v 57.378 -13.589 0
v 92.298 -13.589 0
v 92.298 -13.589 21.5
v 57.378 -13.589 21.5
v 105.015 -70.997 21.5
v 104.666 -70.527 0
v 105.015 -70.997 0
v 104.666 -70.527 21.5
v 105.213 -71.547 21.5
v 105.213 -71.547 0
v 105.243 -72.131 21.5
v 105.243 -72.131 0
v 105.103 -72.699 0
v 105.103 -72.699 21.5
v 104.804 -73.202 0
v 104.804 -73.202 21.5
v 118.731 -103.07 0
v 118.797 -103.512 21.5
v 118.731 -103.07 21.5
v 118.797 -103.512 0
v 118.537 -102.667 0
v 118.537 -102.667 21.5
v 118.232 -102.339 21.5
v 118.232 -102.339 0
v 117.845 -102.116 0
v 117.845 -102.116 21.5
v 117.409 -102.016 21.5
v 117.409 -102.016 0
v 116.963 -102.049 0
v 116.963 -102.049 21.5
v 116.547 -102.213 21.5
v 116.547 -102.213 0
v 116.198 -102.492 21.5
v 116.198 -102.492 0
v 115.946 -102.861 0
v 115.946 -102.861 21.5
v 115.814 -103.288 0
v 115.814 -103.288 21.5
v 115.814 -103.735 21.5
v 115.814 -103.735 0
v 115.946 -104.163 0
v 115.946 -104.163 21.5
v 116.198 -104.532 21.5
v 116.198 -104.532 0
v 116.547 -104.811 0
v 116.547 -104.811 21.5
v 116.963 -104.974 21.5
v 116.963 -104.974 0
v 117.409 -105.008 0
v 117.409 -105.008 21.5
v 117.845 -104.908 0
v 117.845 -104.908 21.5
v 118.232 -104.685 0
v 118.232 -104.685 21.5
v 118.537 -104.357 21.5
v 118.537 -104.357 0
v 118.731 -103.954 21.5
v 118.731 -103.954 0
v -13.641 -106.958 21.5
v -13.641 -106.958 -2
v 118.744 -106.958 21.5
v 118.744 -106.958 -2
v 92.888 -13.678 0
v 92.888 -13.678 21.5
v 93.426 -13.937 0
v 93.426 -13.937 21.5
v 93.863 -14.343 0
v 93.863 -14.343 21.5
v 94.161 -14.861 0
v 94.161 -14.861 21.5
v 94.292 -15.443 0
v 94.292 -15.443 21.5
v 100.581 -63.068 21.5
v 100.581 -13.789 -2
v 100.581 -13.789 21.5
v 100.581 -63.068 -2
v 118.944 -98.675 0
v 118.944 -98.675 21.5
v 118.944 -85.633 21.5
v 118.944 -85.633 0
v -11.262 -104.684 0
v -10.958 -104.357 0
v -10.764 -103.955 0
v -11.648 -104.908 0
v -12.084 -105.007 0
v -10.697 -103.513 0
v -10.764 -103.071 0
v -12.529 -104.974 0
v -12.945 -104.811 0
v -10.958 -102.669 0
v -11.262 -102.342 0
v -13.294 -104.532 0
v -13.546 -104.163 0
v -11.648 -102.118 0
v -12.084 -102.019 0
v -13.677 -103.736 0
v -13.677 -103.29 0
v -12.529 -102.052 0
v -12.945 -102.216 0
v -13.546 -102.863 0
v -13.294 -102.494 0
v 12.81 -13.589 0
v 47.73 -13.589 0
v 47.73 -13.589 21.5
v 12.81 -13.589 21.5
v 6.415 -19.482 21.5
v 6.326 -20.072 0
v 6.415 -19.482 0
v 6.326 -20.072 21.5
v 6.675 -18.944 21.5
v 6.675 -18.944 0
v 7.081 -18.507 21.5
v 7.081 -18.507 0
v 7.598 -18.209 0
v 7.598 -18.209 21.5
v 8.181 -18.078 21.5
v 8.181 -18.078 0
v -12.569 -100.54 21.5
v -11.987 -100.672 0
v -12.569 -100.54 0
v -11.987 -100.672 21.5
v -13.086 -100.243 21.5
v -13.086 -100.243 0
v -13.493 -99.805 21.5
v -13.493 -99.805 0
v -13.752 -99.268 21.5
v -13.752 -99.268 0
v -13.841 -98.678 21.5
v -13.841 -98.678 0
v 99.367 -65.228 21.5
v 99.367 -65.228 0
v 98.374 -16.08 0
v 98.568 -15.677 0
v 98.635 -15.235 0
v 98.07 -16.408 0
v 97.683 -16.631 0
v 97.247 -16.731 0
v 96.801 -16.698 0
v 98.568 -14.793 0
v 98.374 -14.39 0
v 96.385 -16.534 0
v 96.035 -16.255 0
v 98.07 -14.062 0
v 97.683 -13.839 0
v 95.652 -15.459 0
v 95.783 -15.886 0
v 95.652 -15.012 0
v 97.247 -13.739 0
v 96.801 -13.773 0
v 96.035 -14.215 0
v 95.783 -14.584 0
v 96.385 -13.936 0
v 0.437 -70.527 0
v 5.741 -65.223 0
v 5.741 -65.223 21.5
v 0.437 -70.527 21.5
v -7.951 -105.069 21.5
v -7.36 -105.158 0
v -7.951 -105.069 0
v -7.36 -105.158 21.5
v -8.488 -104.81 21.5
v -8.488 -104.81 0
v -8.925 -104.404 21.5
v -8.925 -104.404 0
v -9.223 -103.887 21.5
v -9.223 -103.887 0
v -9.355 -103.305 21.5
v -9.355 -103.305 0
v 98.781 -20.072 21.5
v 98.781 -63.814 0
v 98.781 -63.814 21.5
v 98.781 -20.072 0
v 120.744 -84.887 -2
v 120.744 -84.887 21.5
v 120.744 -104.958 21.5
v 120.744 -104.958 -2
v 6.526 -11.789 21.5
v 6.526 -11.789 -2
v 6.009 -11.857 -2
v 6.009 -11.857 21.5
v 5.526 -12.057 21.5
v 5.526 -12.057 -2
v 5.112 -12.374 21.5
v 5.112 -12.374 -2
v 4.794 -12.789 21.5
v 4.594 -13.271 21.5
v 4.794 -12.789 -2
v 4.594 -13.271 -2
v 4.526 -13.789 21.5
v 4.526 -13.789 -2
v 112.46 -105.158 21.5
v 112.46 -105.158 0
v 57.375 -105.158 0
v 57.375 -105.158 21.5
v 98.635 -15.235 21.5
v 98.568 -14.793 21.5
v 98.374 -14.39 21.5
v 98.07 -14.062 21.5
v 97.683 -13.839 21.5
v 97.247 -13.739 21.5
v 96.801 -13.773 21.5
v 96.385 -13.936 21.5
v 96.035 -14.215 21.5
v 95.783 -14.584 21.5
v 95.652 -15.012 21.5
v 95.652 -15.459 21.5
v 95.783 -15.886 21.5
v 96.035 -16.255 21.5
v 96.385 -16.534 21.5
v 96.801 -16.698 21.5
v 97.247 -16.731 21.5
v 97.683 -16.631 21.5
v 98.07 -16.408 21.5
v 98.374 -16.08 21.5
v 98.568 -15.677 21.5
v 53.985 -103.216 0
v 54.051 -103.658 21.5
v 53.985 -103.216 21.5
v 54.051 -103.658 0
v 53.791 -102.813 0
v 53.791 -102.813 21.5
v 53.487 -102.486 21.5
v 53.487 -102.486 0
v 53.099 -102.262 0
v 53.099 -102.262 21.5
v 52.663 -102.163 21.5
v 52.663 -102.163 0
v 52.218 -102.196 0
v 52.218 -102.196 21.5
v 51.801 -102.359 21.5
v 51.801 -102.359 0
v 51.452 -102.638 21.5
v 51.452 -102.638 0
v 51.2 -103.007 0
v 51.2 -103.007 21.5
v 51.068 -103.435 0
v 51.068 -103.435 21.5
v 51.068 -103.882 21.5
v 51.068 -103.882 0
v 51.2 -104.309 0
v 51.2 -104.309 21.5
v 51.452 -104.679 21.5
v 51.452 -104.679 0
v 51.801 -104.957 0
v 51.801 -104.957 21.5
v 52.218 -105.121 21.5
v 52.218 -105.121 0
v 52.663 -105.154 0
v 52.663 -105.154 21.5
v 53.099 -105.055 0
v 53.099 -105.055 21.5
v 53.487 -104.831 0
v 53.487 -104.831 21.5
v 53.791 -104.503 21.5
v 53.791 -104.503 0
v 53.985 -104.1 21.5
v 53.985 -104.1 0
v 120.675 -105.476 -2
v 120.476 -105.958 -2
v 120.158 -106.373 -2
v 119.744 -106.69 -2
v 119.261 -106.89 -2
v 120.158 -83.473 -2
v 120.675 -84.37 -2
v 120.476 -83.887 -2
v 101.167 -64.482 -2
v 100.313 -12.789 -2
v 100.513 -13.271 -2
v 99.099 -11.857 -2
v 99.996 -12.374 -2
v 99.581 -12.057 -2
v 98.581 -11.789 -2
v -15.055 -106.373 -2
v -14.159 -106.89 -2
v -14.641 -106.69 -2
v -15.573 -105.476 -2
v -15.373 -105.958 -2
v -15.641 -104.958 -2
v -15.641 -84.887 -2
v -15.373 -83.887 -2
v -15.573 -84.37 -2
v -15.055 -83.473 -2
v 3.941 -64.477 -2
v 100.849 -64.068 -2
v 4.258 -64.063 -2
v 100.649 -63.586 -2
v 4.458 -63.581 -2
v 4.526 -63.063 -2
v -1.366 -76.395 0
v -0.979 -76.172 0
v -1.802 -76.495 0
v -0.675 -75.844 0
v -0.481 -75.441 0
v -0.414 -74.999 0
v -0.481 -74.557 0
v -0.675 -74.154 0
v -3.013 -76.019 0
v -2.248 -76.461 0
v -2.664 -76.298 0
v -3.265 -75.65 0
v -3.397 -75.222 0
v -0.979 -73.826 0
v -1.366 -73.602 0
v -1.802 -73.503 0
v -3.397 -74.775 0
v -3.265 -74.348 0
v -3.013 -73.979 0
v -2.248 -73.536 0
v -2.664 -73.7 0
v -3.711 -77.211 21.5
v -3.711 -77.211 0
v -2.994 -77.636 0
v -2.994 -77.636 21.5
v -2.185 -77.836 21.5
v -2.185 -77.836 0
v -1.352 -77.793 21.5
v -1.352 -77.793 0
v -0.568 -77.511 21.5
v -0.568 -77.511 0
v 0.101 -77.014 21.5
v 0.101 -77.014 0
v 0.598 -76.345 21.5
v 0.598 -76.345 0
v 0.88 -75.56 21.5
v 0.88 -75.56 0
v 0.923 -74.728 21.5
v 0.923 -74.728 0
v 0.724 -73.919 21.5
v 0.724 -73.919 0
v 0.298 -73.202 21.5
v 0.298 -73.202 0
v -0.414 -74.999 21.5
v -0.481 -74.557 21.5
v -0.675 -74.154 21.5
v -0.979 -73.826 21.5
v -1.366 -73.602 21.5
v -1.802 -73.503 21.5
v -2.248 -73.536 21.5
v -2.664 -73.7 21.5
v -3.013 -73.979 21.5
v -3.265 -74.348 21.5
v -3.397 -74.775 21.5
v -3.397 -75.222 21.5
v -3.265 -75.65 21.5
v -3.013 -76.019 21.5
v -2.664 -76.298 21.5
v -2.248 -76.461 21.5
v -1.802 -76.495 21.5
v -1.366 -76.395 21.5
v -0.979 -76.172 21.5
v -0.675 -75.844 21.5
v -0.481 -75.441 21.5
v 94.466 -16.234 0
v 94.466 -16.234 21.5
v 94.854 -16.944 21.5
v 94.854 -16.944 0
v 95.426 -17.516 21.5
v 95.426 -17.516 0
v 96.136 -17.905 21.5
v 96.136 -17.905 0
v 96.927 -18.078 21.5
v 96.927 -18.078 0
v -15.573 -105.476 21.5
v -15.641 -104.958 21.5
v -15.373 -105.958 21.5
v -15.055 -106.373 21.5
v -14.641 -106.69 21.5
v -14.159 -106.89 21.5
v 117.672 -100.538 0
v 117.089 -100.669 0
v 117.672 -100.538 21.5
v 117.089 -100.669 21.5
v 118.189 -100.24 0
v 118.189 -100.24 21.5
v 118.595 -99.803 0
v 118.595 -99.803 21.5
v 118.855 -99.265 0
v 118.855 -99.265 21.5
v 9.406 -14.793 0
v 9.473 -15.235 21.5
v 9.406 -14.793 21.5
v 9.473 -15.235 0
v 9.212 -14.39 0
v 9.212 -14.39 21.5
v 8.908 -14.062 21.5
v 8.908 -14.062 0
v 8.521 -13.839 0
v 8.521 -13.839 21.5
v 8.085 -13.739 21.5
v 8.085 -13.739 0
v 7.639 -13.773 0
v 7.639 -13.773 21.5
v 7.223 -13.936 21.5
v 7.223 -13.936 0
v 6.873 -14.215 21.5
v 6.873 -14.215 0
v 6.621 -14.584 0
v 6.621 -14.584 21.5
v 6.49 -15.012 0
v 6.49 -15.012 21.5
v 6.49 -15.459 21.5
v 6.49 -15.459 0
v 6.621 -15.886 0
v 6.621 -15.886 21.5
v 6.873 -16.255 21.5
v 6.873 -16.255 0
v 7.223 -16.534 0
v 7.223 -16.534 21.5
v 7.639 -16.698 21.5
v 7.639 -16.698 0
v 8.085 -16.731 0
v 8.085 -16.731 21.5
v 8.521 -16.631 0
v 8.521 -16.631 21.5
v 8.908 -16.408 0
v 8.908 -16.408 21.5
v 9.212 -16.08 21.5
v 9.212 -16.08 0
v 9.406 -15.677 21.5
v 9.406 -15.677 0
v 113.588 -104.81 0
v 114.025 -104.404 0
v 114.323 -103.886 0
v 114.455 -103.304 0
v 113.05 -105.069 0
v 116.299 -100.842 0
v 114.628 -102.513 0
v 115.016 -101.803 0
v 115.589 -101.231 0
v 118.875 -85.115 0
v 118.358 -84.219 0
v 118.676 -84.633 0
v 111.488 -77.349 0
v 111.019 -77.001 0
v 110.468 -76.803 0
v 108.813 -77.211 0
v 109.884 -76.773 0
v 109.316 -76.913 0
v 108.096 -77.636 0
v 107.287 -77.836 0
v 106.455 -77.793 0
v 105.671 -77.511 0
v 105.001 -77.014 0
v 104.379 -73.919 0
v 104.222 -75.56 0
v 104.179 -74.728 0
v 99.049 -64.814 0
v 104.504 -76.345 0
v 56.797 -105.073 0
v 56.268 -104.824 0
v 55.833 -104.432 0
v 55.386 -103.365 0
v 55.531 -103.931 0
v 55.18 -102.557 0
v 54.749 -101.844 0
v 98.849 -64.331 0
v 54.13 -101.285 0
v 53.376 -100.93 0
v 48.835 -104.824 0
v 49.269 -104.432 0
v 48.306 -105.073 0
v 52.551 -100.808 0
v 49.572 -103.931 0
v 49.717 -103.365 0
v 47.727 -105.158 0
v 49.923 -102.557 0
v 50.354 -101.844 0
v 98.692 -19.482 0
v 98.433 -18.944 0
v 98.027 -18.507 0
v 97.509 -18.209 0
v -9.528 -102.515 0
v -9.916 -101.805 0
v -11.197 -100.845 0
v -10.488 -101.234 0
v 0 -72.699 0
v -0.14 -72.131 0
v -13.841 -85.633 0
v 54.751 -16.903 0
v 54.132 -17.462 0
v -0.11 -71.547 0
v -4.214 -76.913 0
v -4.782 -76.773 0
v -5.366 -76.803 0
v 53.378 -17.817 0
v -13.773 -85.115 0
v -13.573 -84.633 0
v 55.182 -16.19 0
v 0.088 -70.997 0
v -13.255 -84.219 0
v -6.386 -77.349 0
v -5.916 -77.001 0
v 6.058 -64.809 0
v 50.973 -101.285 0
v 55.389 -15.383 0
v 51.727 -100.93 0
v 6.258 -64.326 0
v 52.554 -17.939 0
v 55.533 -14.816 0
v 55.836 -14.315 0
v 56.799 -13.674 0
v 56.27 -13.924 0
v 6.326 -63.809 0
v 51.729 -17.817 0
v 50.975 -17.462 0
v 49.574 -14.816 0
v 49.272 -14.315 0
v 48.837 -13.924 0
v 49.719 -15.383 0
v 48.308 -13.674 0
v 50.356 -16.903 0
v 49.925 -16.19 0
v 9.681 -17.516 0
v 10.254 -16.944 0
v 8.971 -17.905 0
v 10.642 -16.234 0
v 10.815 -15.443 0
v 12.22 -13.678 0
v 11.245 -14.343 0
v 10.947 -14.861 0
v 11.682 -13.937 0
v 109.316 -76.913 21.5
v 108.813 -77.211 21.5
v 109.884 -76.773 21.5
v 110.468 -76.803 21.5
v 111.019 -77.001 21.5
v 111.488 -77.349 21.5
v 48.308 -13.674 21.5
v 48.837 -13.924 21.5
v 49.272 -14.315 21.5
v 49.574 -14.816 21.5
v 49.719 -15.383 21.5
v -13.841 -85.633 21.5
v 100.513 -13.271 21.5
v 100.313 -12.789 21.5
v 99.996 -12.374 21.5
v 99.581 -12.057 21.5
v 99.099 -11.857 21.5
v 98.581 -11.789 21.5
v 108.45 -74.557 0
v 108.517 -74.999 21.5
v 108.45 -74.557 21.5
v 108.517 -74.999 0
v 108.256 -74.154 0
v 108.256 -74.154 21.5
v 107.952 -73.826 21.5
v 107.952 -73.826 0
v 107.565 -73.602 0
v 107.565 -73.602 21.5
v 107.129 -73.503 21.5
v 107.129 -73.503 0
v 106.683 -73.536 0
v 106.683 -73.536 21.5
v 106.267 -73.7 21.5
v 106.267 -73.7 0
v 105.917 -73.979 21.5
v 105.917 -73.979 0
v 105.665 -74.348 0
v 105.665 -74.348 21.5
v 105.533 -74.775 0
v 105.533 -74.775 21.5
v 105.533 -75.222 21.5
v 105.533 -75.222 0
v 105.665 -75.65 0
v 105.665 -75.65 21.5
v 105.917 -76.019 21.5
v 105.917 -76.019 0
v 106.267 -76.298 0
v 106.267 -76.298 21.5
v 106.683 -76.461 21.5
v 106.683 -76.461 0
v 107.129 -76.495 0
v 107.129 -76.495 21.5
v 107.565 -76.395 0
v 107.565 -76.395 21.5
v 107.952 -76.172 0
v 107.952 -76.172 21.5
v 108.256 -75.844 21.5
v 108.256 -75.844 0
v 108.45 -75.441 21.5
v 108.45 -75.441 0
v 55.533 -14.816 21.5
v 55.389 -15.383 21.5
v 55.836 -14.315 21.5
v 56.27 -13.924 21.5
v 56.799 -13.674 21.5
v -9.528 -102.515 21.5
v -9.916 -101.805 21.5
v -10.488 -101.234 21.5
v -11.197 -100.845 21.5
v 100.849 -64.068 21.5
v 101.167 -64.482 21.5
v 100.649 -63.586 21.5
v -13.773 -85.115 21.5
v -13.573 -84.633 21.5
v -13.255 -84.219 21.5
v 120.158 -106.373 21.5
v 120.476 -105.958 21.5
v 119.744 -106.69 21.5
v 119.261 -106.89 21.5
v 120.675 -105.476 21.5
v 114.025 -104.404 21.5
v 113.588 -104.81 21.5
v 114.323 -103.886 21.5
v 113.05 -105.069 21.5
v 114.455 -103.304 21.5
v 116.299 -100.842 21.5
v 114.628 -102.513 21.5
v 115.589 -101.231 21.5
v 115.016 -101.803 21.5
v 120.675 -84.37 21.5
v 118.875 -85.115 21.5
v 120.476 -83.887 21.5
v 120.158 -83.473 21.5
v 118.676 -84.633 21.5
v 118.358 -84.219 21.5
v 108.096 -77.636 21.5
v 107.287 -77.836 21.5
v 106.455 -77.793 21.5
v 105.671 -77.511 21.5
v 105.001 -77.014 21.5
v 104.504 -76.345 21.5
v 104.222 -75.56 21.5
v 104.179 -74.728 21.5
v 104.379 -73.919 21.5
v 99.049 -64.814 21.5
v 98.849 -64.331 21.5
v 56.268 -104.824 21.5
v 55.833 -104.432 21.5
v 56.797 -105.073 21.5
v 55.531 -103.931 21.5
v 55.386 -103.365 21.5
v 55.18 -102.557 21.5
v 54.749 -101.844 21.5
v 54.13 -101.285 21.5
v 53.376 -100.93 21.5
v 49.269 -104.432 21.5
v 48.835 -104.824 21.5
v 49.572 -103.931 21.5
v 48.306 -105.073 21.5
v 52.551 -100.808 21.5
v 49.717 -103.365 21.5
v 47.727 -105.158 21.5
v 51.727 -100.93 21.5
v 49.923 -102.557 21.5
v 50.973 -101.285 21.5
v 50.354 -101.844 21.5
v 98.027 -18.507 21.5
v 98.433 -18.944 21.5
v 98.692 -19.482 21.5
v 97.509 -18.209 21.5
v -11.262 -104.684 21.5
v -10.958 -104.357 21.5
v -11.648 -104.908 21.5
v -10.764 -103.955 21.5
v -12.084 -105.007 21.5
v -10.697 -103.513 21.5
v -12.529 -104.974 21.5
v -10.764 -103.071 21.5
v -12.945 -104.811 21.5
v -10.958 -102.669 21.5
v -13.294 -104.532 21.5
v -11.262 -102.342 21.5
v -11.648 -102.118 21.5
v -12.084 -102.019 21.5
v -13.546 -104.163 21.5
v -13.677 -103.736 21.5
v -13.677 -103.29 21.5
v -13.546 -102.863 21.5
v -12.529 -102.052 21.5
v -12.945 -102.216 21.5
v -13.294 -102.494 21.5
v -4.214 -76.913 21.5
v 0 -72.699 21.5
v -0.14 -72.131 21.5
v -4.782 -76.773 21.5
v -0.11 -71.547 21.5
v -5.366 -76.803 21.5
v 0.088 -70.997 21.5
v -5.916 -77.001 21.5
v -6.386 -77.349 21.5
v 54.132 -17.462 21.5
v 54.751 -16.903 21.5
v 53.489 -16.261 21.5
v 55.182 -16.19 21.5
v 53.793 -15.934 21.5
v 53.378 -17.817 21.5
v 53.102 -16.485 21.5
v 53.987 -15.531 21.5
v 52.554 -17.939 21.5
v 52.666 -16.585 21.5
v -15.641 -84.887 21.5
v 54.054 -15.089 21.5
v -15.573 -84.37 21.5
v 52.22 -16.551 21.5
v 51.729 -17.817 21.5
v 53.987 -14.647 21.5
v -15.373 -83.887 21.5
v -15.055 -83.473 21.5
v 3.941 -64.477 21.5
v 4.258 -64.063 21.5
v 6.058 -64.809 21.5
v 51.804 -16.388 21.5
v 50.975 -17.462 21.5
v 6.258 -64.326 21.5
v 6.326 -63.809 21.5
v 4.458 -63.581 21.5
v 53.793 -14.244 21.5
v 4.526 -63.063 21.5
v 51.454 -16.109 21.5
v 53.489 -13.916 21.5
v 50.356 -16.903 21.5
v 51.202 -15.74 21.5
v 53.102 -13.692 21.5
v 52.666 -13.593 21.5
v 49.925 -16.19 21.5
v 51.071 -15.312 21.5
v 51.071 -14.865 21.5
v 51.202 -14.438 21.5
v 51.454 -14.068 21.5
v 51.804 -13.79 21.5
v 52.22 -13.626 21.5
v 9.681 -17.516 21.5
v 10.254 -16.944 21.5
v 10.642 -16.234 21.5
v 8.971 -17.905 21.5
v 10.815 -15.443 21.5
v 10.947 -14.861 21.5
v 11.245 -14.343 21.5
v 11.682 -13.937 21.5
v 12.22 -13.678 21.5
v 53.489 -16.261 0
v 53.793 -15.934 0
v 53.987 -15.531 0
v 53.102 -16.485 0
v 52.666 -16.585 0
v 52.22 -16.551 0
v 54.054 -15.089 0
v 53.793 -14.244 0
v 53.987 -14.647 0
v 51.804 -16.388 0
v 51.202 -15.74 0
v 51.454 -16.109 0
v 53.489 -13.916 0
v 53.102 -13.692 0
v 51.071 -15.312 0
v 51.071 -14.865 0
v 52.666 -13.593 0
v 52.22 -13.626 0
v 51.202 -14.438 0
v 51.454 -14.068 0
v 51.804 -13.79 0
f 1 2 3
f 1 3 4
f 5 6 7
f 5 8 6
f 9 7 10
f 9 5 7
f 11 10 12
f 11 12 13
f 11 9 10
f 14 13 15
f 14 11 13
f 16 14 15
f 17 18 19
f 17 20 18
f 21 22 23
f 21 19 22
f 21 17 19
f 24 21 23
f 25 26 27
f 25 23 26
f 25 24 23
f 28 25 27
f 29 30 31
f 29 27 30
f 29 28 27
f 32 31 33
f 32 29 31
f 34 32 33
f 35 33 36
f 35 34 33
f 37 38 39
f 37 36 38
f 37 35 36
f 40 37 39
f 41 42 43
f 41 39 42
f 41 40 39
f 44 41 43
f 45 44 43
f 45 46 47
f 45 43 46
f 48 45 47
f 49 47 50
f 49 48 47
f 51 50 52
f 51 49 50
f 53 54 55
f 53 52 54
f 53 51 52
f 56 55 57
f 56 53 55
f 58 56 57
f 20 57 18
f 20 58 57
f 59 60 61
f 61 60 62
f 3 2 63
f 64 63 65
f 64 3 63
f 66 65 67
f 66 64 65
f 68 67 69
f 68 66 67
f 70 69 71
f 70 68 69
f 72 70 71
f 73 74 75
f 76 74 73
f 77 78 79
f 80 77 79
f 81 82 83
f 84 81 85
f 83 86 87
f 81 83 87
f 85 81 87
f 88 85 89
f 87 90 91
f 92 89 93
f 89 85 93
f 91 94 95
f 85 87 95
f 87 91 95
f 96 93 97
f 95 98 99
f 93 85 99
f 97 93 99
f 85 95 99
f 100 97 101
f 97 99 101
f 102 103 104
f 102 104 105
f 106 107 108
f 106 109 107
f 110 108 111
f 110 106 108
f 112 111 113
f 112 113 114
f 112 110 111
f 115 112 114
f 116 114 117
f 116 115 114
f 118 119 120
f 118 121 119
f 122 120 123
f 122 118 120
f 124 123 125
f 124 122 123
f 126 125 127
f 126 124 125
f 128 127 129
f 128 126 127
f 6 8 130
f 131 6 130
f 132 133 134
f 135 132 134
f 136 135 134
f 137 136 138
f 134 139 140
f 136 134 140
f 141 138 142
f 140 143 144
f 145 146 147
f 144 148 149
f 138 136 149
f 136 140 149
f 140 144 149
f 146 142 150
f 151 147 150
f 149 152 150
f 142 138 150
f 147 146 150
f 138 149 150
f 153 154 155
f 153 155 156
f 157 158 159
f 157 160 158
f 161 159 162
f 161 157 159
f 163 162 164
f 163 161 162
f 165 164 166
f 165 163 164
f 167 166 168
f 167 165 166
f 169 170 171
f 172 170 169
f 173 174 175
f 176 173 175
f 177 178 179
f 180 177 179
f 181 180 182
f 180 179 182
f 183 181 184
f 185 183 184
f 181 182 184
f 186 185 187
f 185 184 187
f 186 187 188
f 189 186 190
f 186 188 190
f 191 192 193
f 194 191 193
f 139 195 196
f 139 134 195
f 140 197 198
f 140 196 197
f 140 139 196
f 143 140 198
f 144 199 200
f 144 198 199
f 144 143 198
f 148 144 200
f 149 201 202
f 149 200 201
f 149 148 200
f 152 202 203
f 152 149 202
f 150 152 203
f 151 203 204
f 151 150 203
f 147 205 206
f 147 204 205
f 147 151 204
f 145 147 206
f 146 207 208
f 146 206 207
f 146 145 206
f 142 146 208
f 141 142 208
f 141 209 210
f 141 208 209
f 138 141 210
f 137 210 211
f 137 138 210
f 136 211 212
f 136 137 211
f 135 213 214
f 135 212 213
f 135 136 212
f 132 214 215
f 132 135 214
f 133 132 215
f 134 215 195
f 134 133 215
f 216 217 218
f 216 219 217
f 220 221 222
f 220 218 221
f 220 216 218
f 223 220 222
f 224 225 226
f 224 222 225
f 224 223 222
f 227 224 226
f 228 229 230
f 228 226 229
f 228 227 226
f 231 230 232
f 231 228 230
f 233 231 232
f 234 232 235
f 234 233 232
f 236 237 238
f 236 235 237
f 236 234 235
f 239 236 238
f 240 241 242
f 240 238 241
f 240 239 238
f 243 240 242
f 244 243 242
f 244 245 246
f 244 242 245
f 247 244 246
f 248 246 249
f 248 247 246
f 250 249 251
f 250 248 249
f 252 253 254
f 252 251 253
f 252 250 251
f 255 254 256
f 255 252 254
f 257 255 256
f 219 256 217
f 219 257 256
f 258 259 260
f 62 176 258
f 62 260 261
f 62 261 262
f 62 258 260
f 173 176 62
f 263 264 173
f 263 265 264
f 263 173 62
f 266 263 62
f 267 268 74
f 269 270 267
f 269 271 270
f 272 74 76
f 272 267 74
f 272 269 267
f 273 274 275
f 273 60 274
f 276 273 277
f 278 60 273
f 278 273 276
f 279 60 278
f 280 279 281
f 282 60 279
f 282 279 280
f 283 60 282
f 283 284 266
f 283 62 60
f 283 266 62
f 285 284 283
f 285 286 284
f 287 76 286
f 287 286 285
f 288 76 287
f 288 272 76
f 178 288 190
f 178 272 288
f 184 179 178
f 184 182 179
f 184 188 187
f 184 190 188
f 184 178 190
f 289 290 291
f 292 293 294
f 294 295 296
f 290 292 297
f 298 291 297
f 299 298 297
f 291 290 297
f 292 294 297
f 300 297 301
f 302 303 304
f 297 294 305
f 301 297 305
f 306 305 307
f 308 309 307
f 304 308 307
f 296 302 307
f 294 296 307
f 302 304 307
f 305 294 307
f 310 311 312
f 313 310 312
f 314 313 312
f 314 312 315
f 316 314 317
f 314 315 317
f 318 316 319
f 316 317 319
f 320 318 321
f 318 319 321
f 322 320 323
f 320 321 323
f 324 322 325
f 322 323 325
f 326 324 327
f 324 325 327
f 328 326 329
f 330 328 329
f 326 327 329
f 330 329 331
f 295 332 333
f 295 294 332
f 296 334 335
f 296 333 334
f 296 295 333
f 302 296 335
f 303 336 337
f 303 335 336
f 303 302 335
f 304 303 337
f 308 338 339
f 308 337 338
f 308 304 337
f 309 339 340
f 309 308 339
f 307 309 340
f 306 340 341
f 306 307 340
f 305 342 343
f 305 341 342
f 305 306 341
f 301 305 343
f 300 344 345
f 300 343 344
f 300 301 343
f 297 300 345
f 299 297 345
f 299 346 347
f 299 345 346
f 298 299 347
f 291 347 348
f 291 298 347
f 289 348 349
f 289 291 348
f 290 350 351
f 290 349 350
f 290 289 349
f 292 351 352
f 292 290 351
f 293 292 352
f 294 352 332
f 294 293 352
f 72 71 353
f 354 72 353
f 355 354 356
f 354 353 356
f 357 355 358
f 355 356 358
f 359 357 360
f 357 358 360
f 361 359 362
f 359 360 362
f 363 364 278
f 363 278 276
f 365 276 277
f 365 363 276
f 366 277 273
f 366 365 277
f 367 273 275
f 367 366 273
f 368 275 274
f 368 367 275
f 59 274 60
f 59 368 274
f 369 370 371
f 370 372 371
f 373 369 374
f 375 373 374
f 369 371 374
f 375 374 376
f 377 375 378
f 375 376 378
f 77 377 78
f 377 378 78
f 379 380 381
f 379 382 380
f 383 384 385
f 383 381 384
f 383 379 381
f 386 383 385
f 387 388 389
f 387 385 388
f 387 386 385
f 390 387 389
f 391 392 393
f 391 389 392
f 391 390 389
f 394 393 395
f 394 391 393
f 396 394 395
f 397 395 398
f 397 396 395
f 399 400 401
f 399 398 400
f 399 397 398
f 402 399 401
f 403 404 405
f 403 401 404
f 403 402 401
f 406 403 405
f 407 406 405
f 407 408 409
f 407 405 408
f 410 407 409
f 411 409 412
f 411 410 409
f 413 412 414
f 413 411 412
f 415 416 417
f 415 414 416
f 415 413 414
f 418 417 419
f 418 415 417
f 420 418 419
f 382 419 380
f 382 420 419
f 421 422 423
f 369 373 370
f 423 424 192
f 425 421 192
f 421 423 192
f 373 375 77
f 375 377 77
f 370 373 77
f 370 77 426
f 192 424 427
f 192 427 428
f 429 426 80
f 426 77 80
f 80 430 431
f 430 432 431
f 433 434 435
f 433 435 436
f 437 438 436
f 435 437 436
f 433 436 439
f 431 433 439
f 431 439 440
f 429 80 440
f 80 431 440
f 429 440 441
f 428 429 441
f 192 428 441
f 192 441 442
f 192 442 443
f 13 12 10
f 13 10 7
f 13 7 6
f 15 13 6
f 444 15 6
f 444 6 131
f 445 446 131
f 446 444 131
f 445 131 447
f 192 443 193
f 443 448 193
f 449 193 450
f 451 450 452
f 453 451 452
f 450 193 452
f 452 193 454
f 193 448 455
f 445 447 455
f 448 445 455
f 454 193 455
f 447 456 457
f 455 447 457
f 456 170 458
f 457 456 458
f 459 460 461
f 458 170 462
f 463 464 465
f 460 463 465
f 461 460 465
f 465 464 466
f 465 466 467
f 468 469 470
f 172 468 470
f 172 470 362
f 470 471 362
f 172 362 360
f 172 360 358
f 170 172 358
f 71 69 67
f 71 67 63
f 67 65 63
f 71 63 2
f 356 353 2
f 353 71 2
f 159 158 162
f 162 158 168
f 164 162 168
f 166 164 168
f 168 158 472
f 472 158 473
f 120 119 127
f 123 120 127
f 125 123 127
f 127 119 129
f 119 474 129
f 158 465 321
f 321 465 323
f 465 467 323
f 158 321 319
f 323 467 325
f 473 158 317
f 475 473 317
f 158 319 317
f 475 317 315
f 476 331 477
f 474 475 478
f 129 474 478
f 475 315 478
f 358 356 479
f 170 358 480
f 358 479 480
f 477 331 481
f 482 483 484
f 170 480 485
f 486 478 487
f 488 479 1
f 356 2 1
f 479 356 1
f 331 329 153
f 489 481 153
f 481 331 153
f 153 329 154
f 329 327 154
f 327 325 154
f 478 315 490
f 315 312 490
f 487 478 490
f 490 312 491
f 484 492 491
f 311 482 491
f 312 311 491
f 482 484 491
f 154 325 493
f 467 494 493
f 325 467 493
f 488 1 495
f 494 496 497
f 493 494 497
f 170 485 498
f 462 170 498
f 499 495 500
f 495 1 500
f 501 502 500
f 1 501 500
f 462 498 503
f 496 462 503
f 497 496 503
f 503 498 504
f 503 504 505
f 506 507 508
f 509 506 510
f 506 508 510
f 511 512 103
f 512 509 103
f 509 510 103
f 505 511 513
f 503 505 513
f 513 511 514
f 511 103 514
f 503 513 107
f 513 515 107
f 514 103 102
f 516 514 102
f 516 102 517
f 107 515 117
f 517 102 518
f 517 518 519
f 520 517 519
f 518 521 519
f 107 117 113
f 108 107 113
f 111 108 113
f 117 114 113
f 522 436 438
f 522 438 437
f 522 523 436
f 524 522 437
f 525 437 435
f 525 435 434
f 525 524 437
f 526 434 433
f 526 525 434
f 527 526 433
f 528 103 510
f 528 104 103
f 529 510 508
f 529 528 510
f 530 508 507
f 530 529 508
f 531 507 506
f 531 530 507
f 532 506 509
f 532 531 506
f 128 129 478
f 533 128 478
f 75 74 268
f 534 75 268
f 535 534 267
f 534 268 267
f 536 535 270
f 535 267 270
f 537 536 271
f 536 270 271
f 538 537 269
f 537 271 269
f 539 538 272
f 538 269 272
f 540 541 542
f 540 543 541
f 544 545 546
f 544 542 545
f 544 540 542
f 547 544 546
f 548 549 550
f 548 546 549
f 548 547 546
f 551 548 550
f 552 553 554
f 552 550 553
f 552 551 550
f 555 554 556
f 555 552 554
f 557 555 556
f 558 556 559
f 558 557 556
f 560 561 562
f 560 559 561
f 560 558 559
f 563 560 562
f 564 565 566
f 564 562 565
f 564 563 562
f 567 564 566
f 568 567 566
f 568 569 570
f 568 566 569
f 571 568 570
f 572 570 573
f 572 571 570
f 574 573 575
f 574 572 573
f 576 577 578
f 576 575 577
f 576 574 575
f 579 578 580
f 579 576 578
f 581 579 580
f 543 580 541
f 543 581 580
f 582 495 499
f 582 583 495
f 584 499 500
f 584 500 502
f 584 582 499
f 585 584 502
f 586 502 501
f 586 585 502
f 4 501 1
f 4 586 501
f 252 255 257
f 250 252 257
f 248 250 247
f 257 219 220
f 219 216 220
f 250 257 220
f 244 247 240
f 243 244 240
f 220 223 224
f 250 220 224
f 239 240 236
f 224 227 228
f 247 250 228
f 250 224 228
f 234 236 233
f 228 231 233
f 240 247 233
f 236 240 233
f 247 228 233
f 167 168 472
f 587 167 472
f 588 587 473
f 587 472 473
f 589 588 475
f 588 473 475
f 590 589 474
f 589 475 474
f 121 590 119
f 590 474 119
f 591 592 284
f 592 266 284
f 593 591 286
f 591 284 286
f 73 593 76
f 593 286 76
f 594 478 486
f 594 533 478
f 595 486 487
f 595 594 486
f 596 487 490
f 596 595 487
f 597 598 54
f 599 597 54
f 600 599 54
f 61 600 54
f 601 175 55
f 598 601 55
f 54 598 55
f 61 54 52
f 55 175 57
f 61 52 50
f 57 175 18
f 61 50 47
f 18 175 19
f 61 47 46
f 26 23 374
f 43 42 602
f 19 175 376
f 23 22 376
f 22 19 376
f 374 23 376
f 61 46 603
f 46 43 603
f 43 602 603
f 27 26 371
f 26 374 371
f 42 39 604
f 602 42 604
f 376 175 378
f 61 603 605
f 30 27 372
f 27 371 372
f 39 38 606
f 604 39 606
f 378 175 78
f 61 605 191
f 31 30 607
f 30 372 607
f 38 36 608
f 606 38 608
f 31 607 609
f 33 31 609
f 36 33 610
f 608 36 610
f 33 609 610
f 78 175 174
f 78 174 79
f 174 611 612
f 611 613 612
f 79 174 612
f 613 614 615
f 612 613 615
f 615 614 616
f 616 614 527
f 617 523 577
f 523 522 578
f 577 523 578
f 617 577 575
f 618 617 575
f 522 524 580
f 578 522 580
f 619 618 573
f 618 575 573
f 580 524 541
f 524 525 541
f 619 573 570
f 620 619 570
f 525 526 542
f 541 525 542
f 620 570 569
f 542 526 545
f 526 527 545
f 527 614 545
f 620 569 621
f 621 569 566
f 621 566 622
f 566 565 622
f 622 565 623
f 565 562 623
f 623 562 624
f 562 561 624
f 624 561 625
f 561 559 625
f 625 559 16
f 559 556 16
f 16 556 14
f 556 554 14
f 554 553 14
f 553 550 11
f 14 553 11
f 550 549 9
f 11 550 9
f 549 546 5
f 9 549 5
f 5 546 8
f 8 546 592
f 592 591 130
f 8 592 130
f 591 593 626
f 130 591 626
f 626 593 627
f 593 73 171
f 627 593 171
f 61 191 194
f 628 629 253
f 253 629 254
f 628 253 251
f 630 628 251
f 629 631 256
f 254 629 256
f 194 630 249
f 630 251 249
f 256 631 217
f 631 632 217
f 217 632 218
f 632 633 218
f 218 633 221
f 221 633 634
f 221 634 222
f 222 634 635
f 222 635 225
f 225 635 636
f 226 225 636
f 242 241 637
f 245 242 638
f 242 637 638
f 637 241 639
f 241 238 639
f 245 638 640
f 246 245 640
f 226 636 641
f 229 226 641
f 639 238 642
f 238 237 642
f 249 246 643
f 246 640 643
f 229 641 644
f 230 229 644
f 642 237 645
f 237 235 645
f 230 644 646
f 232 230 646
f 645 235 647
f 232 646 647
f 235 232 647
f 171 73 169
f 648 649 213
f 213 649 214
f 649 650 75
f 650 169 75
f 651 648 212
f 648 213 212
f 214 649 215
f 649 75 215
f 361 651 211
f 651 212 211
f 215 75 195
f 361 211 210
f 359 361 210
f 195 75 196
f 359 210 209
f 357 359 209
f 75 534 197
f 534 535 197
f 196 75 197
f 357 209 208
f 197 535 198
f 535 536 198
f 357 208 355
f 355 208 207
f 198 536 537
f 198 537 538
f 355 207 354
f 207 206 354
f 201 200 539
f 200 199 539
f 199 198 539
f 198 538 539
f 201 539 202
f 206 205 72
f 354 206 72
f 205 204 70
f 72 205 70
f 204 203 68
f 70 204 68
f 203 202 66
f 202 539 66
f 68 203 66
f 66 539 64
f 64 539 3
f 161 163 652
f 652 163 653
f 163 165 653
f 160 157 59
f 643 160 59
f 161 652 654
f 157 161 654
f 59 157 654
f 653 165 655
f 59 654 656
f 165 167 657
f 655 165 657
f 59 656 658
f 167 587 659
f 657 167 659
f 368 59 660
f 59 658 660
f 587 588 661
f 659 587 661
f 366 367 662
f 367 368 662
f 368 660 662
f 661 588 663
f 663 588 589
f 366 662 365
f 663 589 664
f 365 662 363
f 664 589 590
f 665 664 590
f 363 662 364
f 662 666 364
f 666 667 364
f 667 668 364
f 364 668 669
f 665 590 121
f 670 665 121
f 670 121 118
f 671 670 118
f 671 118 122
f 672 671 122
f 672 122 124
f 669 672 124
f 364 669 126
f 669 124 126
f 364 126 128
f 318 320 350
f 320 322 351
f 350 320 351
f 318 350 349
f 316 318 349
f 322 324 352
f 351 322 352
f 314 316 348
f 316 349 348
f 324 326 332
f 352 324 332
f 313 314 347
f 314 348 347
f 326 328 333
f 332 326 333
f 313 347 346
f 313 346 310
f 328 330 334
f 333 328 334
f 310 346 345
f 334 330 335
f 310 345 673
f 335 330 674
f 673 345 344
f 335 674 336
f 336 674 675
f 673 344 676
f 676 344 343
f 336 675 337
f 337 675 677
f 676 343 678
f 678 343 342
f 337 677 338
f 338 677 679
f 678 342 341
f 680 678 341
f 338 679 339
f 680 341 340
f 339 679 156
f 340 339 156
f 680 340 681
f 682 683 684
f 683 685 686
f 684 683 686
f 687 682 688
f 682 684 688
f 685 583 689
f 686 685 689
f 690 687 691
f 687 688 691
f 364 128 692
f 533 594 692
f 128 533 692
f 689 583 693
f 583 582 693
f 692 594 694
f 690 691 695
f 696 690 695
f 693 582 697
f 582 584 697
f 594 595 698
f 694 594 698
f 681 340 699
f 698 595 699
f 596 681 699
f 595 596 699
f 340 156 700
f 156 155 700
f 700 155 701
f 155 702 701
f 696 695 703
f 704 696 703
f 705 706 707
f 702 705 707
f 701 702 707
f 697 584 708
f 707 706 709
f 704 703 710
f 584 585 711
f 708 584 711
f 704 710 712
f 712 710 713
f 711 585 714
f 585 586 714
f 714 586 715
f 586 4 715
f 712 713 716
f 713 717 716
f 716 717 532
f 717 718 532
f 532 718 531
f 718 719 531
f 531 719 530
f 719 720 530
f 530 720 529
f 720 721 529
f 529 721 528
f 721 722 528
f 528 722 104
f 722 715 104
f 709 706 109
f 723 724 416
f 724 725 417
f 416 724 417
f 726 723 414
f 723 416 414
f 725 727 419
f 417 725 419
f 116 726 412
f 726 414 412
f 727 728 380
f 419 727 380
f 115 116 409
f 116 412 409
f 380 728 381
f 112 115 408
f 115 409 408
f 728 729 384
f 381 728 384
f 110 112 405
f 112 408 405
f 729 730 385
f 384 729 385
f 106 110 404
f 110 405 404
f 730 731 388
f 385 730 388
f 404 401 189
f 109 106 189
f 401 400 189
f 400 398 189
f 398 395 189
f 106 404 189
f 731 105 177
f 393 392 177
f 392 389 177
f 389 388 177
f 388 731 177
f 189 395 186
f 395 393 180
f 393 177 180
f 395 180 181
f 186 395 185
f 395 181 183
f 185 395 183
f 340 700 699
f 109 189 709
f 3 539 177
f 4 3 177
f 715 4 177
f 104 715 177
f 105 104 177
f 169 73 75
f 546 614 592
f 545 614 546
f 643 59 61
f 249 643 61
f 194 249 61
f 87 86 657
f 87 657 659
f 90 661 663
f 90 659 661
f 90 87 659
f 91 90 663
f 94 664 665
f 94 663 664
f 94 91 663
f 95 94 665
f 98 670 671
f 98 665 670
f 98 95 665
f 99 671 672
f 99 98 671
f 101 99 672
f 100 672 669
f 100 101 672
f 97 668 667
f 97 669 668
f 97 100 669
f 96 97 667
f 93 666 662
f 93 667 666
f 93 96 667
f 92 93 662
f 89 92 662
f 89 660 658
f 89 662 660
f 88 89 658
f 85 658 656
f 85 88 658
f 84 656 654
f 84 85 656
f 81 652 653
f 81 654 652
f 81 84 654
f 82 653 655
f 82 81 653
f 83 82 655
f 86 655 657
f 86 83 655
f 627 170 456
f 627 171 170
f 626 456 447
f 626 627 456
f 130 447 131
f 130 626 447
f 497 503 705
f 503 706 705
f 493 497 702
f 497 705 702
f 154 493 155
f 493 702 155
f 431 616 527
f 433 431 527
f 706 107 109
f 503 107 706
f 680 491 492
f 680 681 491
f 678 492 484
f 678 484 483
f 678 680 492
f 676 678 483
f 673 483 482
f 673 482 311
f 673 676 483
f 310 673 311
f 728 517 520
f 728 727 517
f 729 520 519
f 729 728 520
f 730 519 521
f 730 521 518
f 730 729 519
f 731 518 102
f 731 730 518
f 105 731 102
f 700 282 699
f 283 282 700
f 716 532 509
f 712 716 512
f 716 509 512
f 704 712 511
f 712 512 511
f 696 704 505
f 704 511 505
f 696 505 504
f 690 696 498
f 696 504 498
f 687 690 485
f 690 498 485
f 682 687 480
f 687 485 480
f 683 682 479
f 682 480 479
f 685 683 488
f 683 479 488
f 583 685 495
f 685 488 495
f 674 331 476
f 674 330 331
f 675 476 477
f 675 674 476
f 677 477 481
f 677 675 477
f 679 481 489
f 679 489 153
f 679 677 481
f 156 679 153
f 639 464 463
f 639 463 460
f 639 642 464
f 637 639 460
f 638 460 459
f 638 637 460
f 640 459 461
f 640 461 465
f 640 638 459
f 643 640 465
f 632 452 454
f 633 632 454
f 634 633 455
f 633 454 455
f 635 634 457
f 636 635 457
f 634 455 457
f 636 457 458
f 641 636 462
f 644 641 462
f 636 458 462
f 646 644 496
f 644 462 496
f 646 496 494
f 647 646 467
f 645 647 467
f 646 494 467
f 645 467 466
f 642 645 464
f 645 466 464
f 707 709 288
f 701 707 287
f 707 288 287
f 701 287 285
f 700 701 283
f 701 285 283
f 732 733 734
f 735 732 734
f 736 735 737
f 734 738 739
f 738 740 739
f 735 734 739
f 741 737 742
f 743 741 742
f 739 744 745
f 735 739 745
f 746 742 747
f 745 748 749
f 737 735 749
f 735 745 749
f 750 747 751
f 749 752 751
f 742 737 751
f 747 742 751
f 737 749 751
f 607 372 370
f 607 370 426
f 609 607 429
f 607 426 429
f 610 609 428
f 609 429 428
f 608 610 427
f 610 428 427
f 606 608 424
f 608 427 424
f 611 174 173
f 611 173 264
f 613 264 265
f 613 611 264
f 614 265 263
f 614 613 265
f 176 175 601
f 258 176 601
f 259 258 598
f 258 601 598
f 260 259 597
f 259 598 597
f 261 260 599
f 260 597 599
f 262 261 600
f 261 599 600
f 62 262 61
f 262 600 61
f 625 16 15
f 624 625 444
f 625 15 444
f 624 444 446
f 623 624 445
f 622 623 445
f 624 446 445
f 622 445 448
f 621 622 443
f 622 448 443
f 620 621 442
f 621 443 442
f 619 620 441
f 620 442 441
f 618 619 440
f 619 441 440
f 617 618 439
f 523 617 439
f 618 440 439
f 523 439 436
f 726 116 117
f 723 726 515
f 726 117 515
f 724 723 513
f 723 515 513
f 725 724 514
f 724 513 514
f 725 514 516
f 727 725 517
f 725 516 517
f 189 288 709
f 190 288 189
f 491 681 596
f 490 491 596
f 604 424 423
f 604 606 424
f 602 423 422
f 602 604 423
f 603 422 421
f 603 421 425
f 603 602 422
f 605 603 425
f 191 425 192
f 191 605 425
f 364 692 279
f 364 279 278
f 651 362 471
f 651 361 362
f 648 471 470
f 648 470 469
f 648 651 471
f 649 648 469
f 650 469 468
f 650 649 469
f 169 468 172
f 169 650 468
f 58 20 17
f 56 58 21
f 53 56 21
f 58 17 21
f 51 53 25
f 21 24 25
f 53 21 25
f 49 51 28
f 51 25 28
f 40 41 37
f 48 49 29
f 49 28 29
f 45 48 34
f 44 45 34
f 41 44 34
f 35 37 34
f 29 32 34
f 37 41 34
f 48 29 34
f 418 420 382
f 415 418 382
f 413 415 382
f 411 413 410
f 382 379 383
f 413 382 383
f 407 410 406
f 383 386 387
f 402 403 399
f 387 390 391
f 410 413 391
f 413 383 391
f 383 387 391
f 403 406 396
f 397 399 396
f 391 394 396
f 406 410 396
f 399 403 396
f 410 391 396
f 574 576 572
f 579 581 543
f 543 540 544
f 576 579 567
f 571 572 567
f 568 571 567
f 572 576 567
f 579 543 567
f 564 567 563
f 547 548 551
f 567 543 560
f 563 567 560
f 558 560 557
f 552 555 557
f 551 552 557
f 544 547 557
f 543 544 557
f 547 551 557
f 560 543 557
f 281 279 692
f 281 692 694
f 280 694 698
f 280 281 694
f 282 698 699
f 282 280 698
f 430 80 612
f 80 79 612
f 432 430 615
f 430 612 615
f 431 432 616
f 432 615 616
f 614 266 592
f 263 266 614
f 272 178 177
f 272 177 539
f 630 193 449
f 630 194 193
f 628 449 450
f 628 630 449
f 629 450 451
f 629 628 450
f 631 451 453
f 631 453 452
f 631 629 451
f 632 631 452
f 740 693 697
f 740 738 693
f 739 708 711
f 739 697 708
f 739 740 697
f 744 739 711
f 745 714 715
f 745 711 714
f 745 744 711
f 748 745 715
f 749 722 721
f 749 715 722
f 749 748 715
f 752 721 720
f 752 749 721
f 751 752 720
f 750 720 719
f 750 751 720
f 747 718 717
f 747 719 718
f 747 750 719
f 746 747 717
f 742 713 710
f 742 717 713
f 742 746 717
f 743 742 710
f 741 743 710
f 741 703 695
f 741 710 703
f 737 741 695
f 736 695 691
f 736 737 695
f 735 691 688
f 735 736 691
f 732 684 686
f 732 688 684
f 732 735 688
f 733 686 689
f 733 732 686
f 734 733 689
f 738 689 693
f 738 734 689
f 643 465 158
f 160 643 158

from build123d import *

# Parameters (mm, degrees)
BOSS_EXTRUDE1_DEPTH       = 2
BOSS_EXTRUDE2_DEPTH       = 21.5
FILLET1_R                 = 2
FILLET2_R                 = 2
BOSS_EXTRUDE3_START       = -22
BOSS_EXTRUDE3_OUTLINE_R   = 1.498302823
BOSS_EXTRUDE3_OUTLINE_R_2 = 1.5
BOSS_EXTRUDE3_DEPTH       = 22
FILLET3_R                 = 2


with BuildPart() as part:
    # Sketch3 → Boss-Extrude1 (new body)
    with BuildSketch(Plane.XY):
        Polygon((-15.640963985, -84.058941087), (4.526340861, -63.891636241), (4.526340861, -11.788708514), (100.581340861, -11.788708514), (100.581340861, -63.896636241), (120.743645706, -84.058941087), (120.743645706, -106.958318205), (104.551340861, -106.958318205), (-15.640963985, -106.958318205), (-15.640963985, -90.76601336), align=None)
    extrude(amount=-BOSS_EXTRUDE1_DEPTH)

    # Sketch3<3> → Boss-Extrude2 (add)
    with BuildSketch(Plane.XY):
        Polygon((-15.640963985, -90.76601336), (-15.640963985, -84.058941087), (4.526340861, -63.891636241), (4.526340861, -11.788708514), (100.581340861, -11.788708514), (100.581340861, -63.896636241), (120.743645706, -84.058941087), (120.743645706, -106.958318205), (104.551340861, -106.958318205), (-15.640963985, -106.958318205), align=None)
        Polygon((-13.840963985, -90.76601336), (-13.840963985, -105.158318205), (104.551340861, -105.158318205), (118.943645706, -105.158318205), (118.943645706, -84.804525499), (98.781340861, -64.642220653), (98.781340861, -13.588708514), (6.326340861, -13.588708514), (6.326340861, -64.637220653), (-13.840963985, -84.804525499), align=None, mode=Mode.SUBTRACT)
    extrude(amount=BOSS_EXTRUDE2_DEPTH)

    # Fillet1
    fillet1_edges = [part.edges().sort_by_distance(p)[0] for p in [
        (-15.640963985, -84.058941087, 9.75),
        (4.526340861, -63.891636241, 9.75),
        (4.526340861, -11.788708514, 9.75),
        (100.581340861, -11.788708514, 9.75),
        (100.581340861, -63.896636241, 9.75),
        (120.743645706, -84.058941087, 9.75),
        (120.743645706, -106.958318205, 9.75),
        (-15.640963985, -106.958318205, 9.75),
        (-13.840963985, -105.158318205, 10.75),
        (-13.840963985, -84.804525499, 10.75),
        (6.326340861, -64.637220653, 10.75),
        (6.326340861, -13.588708514, 10.75),
        (98.781340861, -13.588708514, 10.75),
        (98.781340861, -64.642220653, 10.75),
        (118.943645706, -105.158318205, 10.75),
    ]]
    fillet(fillet1_edges, radius=FILLET1_R)

    # Fillet2
    fillet2_edges = [part.edges().sort_by_distance(p)[0] for p in [
        (118.943645706, -84.804525499, 10.75),
    ]]
    fillet(fillet2_edges, radius=FILLET2_R)

    # Boss-Extrude3: read off the stored shape, not the designer's step
    # Boss-Extrude3 outline → Boss-Extrude3 (add)
    with BuildSketch(Plane.XY.offset(21.5).offset(BOSS_EXTRUDE3_START)):
        with BuildLine():
            ThreePointArc((101.167127298, -64.482422679), (100.733581796, -63.833575981), (100.581340861, -63.068209116))
            Line((100.581340861, -63.068209116), (100.581340861, -13.788708514))
            ThreePointArc((100.581340861, -13.788708514), (99.995554423, -12.374494952), (98.581340861, -11.788708514))
            Line((98.581340861, -11.788708514), (6.526340861, -11.788708514))
            ThreePointArc((6.526340861, -11.788708514), (5.112127298, -12.374494952), (4.526340861, -13.788708514))
            Line((4.526340861, -13.788708514), (4.526340861, -63.063209116))
            ThreePointArc((4.526340861, -63.063209116), (4.374099926, -63.828575981), (3.940554423, -64.477422679))
            Line((3.940554423, -64.477422679), (-15.055177547, -83.473154649))
            ThreePointArc((-15.055177547, -83.473154649), (-15.48872305, -84.122001347), (-15.640963985, -84.887368211))
            Line((-15.640963985, -84.887368211), (-15.640963985, -104.958318205))
            ThreePointArc((-15.640963985, -104.958318205), (-15.055177547, -106.372531767), (-13.640963985, -106.958318205))
            Line((-13.640963985, -106.958318205), (118.743645706, -106.958318205))
            ThreePointArc((118.743645706, -106.958318205), (120.157859269, -106.372531767), (120.743645706, -104.958318205))
            Line((120.743645706, -104.958318205), (120.743645706, -84.887368211))
            ThreePointArc((120.743645706, -84.887368211), (120.591404771, -84.122001347), (120.157859269, -83.473154649))
            Line((120.157859269, -83.473154649), (101.167127298, -64.482422679))
        make_face()
        with Locations((-12.195717461, -103.513071681)):
            Circle(BOSS_EXTRUDE3_OUTLINE_R, mode=Mode.SUBTRACT)
        with Locations((-1.913886606, -74.998768464)):
            Circle(BOSS_EXTRUDE3_OUTLINE_R_2, mode=Mode.SUBTRACT)
        with Locations((52.551340861, -103.658318205)):
            Circle(BOSS_EXTRUDE3_OUTLINE_R_2, mode=Mode.SUBTRACT)
        with Locations((117.297199097, -103.511871596)):
            Circle(BOSS_EXTRUDE3_OUTLINE_R_2, mode=Mode.SUBTRACT)
        with Locations((107.016568327, -74.998768464)):
            Circle(BOSS_EXTRUDE3_OUTLINE_R_2, mode=Mode.SUBTRACT)
        with BuildLine():
            ThreePointArc((-13.840963985, -85.632952624), (-13.68872305, -84.867585759), (-13.255177547, -84.218739061))
            Line((-13.255177547, -84.218739061), (-4.688095726, -75.651657241))
            ThreePointArc((-4.688095726, -75.651657241), (0.101367721, -77.01402279), (-1.260997829, -72.224559343))
            Line((-1.260997829, -72.224559343), (5.740554423, -65.223007091))
            ThreePointArc((5.740554423, -65.223007091), (6.174099926, -64.574160393), (6.326340861, -63.808793529))
            Line((6.326340861, -63.808793529), (6.326340861, -17.561464123))
            ThreePointArc((6.326340861, -17.561464123), (9.988041797, -17.25040945), (10.29909647, -13.588708514))
            Line((10.29909647, -13.588708514), (50.130516698, -13.588708514))
            ThreePointArc((50.130516698, -13.588708514), (52.553840861, -17.938708514), (54.977165024, -13.588708514))
            Line((54.977165024, -13.588708514), (94.808585252, -13.588708514))
            ThreePointArc((94.808585252, -13.588708514), (95.119639925, -17.25040945), (98.781340861, -17.561464123))
            Line((98.781340861, -17.561464123), (98.781340861, -63.813793529))
            ThreePointArc((98.781340861, -63.813793529), (98.933581796, -64.579160393), (99.367127298, -65.228007091))
            Line((99.367127298, -65.228007091), (106.36367955, -72.224559343))
            ThreePointArc((106.36367955, -72.224559343), (105.001314001, -77.01402279), (109.790777448, -75.651657241))
            Line((109.790777448, -75.651657241), (118.357859269, -84.218739061))
            ThreePointArc((118.357859269, -84.218739061), (118.791404771, -84.867585759), (118.943645706, -85.632952624))
            Line((118.943645706, -85.632952624), (118.943645706, -101.185562596))
            ThreePointArc((118.943645706, -101.185562596), (115.28194477, -101.496617269), (114.970890097, -105.158318205))
            Line((114.970890097, -105.158318205), (54.974665024, -105.158318205))
            ThreePointArc((54.974665024, -105.158318205), (52.551340861, -100.808318205), (50.128016698, -105.158318205))
            Line((50.128016698, -105.158318205), (-9.870638356, -105.158318205))
            ThreePointArc((-9.870638356, -105.158318205), (-10.18166322, -101.49901744), (-13.840963985, -101.187992576))
            Line((-13.840963985, -101.187992576), (-13.840963985, -85.632952624))
        make_face(mode=Mode.SUBTRACT)
        with Locations((7.97278747, -15.235155124)):
            Circle(BOSS_EXTRUDE3_OUTLINE_R_2, mode=Mode.SUBTRACT)
        with Locations((52.553840861, -15.088708514)):
            Circle(BOSS_EXTRUDE3_OUTLINE_R_2, mode=Mode.SUBTRACT)
        with Locations((97.134894251, -15.235155124)):
            Circle(BOSS_EXTRUDE3_OUTLINE_R_2, mode=Mode.SUBTRACT)
    extrude(amount=BOSS_EXTRUDE3_DEPTH)

    # Fillet3
    fillet3_edges = [part.edges().sort_by_distance(p)[0] for p in [
        (10.29909647, -13.588708514, 10.75),
        (6.326340861, -17.561464123, 10.75),
        (54.977165024, -13.588708514, 10.75),
        (50.130516698, -13.588708514, 10.75),
        (94.808585252, -13.588708514, 10.75),
        (98.781340861, -17.561464123, 10.75),
        (109.790777448, -75.651657241, 10.75),
        (106.36367955, -72.224559343, 10.75),
        (118.943645706, -101.185562596, 10.75),
        (114.970890097, -105.158318205, 10.75),
        (50.128016698, -105.158318205, 10.75),
        (54.974665024, -105.158318205, 10.75),
        (-9.870638356, -105.158318205, 10.75),
        (-13.840963985, -101.187992576, 10.75),
        (-4.688095726, -75.651657241, 10.75),
        (-1.260997829, -72.224559343, 10.75),
    ]]
    fillet(fillet3_edges, radius=FILLET3_R)


solid = part.part
